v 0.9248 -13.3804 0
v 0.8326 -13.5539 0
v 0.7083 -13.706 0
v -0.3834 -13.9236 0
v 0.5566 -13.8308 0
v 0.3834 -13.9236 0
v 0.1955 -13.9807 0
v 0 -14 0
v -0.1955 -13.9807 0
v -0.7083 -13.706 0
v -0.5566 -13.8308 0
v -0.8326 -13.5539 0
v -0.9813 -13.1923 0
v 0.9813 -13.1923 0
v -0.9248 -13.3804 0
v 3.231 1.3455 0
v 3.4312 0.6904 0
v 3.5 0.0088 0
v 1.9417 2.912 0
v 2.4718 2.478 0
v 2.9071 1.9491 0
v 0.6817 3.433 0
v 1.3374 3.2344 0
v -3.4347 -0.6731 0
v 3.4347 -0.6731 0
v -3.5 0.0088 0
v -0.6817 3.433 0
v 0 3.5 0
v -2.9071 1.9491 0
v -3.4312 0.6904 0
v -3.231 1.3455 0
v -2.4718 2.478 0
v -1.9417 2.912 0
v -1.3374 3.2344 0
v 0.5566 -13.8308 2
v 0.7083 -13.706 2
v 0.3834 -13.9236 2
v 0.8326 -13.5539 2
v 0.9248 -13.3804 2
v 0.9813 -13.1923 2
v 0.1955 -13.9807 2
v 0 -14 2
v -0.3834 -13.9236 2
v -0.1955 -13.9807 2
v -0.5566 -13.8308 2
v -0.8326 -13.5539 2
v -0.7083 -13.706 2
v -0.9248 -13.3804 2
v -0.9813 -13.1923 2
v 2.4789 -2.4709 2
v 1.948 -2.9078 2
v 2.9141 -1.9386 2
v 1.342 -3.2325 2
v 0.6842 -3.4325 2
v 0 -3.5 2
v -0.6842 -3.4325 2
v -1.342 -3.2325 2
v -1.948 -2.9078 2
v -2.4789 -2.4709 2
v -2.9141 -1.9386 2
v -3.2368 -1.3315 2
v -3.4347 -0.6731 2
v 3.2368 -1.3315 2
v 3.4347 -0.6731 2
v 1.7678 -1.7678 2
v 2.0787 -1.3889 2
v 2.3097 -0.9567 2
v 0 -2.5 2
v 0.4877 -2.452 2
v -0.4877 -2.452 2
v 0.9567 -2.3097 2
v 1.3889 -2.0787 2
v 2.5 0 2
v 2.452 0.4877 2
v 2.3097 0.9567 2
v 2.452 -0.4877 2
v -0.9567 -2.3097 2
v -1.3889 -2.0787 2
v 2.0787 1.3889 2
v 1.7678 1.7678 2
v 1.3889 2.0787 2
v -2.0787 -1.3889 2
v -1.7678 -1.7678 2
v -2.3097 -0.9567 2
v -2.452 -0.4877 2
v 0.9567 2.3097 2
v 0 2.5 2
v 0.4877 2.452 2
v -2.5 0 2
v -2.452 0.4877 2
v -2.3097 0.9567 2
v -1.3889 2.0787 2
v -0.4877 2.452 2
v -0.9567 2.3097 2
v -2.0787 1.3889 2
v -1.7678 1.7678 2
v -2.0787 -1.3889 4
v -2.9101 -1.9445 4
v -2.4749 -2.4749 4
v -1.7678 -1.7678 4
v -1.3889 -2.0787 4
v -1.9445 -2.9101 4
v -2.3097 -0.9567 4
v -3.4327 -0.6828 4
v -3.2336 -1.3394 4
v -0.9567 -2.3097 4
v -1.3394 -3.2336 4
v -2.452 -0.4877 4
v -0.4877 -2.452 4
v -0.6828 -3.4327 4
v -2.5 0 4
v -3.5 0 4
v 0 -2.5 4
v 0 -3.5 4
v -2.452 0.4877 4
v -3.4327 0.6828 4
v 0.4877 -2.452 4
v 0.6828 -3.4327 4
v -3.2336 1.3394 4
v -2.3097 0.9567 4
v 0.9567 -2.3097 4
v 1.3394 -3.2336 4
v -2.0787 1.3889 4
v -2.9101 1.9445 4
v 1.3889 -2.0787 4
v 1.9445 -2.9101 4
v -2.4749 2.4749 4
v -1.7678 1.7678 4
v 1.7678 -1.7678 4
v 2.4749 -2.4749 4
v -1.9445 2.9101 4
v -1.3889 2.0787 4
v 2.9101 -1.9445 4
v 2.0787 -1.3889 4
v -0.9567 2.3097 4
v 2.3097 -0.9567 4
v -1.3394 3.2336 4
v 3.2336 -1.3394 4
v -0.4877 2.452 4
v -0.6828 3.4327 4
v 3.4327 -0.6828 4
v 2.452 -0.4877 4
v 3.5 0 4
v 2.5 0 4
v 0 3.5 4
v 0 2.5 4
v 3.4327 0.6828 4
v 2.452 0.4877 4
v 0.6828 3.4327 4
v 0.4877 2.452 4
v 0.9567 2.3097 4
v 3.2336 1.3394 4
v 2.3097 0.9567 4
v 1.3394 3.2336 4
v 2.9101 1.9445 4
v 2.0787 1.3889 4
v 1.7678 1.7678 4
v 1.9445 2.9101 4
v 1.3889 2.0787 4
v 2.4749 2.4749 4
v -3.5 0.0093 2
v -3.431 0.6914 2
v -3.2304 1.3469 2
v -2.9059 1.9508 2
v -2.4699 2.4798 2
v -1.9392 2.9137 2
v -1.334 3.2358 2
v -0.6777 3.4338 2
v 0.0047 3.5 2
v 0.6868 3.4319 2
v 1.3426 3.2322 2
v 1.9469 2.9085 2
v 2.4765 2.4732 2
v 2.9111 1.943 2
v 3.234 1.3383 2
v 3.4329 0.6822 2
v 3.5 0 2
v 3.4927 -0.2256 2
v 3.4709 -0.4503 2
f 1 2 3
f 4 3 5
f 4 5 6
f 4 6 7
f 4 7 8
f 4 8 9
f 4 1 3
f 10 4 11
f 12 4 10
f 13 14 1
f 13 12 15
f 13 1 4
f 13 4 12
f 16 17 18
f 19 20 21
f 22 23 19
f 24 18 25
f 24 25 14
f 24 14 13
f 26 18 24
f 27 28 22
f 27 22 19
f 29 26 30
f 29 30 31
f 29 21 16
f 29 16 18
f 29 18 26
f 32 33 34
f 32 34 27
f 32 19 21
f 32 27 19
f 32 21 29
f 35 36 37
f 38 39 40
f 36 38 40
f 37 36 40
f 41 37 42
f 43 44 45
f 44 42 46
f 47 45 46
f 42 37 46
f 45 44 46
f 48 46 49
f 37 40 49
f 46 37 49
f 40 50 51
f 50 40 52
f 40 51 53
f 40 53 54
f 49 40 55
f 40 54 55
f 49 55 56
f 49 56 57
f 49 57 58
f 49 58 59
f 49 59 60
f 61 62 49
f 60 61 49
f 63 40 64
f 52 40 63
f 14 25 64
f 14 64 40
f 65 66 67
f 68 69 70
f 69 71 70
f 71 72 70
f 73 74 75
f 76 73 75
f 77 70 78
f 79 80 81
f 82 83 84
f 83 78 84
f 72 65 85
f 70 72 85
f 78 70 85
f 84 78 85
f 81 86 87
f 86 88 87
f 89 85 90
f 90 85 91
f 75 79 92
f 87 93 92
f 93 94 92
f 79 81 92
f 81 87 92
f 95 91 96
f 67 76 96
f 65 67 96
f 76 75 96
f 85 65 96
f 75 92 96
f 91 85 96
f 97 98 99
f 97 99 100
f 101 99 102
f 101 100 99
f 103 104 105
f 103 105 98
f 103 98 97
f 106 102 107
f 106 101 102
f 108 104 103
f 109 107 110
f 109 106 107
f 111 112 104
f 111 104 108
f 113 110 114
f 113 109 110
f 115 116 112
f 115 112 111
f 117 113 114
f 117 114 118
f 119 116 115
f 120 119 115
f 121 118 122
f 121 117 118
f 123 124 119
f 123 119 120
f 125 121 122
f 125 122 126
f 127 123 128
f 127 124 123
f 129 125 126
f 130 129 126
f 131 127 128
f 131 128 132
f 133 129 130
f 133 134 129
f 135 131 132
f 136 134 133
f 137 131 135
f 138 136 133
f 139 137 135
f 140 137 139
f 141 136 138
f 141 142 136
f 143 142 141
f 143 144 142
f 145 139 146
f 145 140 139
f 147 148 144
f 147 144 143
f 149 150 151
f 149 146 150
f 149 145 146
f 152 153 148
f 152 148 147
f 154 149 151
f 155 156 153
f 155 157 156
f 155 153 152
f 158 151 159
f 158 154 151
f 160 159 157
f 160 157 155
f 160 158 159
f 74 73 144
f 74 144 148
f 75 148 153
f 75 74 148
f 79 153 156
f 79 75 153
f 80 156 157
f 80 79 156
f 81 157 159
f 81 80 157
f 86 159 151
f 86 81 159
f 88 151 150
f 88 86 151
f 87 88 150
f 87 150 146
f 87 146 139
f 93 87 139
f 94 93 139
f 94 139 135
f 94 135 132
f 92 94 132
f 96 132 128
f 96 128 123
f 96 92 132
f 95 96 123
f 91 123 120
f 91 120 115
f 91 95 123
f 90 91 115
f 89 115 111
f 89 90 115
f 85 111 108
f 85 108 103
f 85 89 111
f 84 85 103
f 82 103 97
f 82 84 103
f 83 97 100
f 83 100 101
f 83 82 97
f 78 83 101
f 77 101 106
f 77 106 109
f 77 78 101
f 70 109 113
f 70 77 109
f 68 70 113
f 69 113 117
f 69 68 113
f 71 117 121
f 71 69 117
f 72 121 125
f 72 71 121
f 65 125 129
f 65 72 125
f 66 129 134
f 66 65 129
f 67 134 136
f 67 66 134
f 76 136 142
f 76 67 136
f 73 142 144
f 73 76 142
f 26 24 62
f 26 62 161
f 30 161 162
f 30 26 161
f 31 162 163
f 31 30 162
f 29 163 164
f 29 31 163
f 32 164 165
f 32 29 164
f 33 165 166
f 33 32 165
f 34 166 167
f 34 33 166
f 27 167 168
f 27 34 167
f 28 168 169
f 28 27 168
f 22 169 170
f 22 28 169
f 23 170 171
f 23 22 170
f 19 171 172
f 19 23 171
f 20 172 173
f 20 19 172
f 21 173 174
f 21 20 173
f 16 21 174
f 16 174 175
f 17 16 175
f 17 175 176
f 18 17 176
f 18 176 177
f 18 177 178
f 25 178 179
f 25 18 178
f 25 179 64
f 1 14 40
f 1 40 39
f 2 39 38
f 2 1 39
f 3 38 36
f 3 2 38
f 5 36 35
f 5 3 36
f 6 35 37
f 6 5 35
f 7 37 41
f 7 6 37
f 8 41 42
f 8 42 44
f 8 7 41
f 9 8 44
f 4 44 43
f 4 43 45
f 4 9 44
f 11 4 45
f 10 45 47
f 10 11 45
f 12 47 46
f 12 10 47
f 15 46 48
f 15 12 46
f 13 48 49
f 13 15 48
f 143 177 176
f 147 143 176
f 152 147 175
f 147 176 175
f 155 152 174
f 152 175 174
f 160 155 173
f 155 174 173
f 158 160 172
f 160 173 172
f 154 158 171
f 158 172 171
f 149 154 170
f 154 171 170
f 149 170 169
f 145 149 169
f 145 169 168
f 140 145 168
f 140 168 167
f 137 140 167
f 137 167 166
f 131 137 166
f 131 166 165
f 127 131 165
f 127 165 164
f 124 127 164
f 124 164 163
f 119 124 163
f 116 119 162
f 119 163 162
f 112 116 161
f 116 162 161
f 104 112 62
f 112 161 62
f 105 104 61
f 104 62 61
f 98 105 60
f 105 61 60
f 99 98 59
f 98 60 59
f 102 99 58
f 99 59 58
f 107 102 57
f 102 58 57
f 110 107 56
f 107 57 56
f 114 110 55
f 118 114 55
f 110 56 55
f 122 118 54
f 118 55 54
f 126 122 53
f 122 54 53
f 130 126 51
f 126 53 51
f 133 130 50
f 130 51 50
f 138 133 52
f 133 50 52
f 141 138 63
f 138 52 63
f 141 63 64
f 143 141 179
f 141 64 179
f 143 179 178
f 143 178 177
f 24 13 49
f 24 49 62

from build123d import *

# Parameters (mm, degrees)
BOSS_EXTRUDE1_DEPTH = 2
SKETCH2_R           = 3.5
SKETCH2_R_2         = 2.5
BOSS_EXTRUDE2_DEPTH = 2


with BuildPart() as part:
    # Sketch1 → Boss-Extrude1 (new body)
    with BuildSketch(Plane.XY):
        with BuildLine():
            Line((-0.981334679, -13.192307692), (-3.434671375, -0.673076923))
            ThreePointArc((-3.434671375, -0.673076923), (0, 3.5), (3.434671375, -0.673076923))
            Line((3.434671375, -0.673076923), (0.981334679, -13.192307692))
            ThreePointArc((0.981334679, -13.192307692), (0, -14), (-0.981334679, -13.192307692))
        make_face()
    extrude(amount=BOSS_EXTRUDE1_DEPTH)

    # Sketch2 → Boss-Extrude2 (add)
    with BuildSketch(Plane.XY.offset(2)):
        Circle(SKETCH2_R)
        Circle(SKETCH2_R_2, mode=Mode.SUBTRACT)
    extrude(amount=BOSS_EXTRUDE2_DEPTH)


solid = part.part
